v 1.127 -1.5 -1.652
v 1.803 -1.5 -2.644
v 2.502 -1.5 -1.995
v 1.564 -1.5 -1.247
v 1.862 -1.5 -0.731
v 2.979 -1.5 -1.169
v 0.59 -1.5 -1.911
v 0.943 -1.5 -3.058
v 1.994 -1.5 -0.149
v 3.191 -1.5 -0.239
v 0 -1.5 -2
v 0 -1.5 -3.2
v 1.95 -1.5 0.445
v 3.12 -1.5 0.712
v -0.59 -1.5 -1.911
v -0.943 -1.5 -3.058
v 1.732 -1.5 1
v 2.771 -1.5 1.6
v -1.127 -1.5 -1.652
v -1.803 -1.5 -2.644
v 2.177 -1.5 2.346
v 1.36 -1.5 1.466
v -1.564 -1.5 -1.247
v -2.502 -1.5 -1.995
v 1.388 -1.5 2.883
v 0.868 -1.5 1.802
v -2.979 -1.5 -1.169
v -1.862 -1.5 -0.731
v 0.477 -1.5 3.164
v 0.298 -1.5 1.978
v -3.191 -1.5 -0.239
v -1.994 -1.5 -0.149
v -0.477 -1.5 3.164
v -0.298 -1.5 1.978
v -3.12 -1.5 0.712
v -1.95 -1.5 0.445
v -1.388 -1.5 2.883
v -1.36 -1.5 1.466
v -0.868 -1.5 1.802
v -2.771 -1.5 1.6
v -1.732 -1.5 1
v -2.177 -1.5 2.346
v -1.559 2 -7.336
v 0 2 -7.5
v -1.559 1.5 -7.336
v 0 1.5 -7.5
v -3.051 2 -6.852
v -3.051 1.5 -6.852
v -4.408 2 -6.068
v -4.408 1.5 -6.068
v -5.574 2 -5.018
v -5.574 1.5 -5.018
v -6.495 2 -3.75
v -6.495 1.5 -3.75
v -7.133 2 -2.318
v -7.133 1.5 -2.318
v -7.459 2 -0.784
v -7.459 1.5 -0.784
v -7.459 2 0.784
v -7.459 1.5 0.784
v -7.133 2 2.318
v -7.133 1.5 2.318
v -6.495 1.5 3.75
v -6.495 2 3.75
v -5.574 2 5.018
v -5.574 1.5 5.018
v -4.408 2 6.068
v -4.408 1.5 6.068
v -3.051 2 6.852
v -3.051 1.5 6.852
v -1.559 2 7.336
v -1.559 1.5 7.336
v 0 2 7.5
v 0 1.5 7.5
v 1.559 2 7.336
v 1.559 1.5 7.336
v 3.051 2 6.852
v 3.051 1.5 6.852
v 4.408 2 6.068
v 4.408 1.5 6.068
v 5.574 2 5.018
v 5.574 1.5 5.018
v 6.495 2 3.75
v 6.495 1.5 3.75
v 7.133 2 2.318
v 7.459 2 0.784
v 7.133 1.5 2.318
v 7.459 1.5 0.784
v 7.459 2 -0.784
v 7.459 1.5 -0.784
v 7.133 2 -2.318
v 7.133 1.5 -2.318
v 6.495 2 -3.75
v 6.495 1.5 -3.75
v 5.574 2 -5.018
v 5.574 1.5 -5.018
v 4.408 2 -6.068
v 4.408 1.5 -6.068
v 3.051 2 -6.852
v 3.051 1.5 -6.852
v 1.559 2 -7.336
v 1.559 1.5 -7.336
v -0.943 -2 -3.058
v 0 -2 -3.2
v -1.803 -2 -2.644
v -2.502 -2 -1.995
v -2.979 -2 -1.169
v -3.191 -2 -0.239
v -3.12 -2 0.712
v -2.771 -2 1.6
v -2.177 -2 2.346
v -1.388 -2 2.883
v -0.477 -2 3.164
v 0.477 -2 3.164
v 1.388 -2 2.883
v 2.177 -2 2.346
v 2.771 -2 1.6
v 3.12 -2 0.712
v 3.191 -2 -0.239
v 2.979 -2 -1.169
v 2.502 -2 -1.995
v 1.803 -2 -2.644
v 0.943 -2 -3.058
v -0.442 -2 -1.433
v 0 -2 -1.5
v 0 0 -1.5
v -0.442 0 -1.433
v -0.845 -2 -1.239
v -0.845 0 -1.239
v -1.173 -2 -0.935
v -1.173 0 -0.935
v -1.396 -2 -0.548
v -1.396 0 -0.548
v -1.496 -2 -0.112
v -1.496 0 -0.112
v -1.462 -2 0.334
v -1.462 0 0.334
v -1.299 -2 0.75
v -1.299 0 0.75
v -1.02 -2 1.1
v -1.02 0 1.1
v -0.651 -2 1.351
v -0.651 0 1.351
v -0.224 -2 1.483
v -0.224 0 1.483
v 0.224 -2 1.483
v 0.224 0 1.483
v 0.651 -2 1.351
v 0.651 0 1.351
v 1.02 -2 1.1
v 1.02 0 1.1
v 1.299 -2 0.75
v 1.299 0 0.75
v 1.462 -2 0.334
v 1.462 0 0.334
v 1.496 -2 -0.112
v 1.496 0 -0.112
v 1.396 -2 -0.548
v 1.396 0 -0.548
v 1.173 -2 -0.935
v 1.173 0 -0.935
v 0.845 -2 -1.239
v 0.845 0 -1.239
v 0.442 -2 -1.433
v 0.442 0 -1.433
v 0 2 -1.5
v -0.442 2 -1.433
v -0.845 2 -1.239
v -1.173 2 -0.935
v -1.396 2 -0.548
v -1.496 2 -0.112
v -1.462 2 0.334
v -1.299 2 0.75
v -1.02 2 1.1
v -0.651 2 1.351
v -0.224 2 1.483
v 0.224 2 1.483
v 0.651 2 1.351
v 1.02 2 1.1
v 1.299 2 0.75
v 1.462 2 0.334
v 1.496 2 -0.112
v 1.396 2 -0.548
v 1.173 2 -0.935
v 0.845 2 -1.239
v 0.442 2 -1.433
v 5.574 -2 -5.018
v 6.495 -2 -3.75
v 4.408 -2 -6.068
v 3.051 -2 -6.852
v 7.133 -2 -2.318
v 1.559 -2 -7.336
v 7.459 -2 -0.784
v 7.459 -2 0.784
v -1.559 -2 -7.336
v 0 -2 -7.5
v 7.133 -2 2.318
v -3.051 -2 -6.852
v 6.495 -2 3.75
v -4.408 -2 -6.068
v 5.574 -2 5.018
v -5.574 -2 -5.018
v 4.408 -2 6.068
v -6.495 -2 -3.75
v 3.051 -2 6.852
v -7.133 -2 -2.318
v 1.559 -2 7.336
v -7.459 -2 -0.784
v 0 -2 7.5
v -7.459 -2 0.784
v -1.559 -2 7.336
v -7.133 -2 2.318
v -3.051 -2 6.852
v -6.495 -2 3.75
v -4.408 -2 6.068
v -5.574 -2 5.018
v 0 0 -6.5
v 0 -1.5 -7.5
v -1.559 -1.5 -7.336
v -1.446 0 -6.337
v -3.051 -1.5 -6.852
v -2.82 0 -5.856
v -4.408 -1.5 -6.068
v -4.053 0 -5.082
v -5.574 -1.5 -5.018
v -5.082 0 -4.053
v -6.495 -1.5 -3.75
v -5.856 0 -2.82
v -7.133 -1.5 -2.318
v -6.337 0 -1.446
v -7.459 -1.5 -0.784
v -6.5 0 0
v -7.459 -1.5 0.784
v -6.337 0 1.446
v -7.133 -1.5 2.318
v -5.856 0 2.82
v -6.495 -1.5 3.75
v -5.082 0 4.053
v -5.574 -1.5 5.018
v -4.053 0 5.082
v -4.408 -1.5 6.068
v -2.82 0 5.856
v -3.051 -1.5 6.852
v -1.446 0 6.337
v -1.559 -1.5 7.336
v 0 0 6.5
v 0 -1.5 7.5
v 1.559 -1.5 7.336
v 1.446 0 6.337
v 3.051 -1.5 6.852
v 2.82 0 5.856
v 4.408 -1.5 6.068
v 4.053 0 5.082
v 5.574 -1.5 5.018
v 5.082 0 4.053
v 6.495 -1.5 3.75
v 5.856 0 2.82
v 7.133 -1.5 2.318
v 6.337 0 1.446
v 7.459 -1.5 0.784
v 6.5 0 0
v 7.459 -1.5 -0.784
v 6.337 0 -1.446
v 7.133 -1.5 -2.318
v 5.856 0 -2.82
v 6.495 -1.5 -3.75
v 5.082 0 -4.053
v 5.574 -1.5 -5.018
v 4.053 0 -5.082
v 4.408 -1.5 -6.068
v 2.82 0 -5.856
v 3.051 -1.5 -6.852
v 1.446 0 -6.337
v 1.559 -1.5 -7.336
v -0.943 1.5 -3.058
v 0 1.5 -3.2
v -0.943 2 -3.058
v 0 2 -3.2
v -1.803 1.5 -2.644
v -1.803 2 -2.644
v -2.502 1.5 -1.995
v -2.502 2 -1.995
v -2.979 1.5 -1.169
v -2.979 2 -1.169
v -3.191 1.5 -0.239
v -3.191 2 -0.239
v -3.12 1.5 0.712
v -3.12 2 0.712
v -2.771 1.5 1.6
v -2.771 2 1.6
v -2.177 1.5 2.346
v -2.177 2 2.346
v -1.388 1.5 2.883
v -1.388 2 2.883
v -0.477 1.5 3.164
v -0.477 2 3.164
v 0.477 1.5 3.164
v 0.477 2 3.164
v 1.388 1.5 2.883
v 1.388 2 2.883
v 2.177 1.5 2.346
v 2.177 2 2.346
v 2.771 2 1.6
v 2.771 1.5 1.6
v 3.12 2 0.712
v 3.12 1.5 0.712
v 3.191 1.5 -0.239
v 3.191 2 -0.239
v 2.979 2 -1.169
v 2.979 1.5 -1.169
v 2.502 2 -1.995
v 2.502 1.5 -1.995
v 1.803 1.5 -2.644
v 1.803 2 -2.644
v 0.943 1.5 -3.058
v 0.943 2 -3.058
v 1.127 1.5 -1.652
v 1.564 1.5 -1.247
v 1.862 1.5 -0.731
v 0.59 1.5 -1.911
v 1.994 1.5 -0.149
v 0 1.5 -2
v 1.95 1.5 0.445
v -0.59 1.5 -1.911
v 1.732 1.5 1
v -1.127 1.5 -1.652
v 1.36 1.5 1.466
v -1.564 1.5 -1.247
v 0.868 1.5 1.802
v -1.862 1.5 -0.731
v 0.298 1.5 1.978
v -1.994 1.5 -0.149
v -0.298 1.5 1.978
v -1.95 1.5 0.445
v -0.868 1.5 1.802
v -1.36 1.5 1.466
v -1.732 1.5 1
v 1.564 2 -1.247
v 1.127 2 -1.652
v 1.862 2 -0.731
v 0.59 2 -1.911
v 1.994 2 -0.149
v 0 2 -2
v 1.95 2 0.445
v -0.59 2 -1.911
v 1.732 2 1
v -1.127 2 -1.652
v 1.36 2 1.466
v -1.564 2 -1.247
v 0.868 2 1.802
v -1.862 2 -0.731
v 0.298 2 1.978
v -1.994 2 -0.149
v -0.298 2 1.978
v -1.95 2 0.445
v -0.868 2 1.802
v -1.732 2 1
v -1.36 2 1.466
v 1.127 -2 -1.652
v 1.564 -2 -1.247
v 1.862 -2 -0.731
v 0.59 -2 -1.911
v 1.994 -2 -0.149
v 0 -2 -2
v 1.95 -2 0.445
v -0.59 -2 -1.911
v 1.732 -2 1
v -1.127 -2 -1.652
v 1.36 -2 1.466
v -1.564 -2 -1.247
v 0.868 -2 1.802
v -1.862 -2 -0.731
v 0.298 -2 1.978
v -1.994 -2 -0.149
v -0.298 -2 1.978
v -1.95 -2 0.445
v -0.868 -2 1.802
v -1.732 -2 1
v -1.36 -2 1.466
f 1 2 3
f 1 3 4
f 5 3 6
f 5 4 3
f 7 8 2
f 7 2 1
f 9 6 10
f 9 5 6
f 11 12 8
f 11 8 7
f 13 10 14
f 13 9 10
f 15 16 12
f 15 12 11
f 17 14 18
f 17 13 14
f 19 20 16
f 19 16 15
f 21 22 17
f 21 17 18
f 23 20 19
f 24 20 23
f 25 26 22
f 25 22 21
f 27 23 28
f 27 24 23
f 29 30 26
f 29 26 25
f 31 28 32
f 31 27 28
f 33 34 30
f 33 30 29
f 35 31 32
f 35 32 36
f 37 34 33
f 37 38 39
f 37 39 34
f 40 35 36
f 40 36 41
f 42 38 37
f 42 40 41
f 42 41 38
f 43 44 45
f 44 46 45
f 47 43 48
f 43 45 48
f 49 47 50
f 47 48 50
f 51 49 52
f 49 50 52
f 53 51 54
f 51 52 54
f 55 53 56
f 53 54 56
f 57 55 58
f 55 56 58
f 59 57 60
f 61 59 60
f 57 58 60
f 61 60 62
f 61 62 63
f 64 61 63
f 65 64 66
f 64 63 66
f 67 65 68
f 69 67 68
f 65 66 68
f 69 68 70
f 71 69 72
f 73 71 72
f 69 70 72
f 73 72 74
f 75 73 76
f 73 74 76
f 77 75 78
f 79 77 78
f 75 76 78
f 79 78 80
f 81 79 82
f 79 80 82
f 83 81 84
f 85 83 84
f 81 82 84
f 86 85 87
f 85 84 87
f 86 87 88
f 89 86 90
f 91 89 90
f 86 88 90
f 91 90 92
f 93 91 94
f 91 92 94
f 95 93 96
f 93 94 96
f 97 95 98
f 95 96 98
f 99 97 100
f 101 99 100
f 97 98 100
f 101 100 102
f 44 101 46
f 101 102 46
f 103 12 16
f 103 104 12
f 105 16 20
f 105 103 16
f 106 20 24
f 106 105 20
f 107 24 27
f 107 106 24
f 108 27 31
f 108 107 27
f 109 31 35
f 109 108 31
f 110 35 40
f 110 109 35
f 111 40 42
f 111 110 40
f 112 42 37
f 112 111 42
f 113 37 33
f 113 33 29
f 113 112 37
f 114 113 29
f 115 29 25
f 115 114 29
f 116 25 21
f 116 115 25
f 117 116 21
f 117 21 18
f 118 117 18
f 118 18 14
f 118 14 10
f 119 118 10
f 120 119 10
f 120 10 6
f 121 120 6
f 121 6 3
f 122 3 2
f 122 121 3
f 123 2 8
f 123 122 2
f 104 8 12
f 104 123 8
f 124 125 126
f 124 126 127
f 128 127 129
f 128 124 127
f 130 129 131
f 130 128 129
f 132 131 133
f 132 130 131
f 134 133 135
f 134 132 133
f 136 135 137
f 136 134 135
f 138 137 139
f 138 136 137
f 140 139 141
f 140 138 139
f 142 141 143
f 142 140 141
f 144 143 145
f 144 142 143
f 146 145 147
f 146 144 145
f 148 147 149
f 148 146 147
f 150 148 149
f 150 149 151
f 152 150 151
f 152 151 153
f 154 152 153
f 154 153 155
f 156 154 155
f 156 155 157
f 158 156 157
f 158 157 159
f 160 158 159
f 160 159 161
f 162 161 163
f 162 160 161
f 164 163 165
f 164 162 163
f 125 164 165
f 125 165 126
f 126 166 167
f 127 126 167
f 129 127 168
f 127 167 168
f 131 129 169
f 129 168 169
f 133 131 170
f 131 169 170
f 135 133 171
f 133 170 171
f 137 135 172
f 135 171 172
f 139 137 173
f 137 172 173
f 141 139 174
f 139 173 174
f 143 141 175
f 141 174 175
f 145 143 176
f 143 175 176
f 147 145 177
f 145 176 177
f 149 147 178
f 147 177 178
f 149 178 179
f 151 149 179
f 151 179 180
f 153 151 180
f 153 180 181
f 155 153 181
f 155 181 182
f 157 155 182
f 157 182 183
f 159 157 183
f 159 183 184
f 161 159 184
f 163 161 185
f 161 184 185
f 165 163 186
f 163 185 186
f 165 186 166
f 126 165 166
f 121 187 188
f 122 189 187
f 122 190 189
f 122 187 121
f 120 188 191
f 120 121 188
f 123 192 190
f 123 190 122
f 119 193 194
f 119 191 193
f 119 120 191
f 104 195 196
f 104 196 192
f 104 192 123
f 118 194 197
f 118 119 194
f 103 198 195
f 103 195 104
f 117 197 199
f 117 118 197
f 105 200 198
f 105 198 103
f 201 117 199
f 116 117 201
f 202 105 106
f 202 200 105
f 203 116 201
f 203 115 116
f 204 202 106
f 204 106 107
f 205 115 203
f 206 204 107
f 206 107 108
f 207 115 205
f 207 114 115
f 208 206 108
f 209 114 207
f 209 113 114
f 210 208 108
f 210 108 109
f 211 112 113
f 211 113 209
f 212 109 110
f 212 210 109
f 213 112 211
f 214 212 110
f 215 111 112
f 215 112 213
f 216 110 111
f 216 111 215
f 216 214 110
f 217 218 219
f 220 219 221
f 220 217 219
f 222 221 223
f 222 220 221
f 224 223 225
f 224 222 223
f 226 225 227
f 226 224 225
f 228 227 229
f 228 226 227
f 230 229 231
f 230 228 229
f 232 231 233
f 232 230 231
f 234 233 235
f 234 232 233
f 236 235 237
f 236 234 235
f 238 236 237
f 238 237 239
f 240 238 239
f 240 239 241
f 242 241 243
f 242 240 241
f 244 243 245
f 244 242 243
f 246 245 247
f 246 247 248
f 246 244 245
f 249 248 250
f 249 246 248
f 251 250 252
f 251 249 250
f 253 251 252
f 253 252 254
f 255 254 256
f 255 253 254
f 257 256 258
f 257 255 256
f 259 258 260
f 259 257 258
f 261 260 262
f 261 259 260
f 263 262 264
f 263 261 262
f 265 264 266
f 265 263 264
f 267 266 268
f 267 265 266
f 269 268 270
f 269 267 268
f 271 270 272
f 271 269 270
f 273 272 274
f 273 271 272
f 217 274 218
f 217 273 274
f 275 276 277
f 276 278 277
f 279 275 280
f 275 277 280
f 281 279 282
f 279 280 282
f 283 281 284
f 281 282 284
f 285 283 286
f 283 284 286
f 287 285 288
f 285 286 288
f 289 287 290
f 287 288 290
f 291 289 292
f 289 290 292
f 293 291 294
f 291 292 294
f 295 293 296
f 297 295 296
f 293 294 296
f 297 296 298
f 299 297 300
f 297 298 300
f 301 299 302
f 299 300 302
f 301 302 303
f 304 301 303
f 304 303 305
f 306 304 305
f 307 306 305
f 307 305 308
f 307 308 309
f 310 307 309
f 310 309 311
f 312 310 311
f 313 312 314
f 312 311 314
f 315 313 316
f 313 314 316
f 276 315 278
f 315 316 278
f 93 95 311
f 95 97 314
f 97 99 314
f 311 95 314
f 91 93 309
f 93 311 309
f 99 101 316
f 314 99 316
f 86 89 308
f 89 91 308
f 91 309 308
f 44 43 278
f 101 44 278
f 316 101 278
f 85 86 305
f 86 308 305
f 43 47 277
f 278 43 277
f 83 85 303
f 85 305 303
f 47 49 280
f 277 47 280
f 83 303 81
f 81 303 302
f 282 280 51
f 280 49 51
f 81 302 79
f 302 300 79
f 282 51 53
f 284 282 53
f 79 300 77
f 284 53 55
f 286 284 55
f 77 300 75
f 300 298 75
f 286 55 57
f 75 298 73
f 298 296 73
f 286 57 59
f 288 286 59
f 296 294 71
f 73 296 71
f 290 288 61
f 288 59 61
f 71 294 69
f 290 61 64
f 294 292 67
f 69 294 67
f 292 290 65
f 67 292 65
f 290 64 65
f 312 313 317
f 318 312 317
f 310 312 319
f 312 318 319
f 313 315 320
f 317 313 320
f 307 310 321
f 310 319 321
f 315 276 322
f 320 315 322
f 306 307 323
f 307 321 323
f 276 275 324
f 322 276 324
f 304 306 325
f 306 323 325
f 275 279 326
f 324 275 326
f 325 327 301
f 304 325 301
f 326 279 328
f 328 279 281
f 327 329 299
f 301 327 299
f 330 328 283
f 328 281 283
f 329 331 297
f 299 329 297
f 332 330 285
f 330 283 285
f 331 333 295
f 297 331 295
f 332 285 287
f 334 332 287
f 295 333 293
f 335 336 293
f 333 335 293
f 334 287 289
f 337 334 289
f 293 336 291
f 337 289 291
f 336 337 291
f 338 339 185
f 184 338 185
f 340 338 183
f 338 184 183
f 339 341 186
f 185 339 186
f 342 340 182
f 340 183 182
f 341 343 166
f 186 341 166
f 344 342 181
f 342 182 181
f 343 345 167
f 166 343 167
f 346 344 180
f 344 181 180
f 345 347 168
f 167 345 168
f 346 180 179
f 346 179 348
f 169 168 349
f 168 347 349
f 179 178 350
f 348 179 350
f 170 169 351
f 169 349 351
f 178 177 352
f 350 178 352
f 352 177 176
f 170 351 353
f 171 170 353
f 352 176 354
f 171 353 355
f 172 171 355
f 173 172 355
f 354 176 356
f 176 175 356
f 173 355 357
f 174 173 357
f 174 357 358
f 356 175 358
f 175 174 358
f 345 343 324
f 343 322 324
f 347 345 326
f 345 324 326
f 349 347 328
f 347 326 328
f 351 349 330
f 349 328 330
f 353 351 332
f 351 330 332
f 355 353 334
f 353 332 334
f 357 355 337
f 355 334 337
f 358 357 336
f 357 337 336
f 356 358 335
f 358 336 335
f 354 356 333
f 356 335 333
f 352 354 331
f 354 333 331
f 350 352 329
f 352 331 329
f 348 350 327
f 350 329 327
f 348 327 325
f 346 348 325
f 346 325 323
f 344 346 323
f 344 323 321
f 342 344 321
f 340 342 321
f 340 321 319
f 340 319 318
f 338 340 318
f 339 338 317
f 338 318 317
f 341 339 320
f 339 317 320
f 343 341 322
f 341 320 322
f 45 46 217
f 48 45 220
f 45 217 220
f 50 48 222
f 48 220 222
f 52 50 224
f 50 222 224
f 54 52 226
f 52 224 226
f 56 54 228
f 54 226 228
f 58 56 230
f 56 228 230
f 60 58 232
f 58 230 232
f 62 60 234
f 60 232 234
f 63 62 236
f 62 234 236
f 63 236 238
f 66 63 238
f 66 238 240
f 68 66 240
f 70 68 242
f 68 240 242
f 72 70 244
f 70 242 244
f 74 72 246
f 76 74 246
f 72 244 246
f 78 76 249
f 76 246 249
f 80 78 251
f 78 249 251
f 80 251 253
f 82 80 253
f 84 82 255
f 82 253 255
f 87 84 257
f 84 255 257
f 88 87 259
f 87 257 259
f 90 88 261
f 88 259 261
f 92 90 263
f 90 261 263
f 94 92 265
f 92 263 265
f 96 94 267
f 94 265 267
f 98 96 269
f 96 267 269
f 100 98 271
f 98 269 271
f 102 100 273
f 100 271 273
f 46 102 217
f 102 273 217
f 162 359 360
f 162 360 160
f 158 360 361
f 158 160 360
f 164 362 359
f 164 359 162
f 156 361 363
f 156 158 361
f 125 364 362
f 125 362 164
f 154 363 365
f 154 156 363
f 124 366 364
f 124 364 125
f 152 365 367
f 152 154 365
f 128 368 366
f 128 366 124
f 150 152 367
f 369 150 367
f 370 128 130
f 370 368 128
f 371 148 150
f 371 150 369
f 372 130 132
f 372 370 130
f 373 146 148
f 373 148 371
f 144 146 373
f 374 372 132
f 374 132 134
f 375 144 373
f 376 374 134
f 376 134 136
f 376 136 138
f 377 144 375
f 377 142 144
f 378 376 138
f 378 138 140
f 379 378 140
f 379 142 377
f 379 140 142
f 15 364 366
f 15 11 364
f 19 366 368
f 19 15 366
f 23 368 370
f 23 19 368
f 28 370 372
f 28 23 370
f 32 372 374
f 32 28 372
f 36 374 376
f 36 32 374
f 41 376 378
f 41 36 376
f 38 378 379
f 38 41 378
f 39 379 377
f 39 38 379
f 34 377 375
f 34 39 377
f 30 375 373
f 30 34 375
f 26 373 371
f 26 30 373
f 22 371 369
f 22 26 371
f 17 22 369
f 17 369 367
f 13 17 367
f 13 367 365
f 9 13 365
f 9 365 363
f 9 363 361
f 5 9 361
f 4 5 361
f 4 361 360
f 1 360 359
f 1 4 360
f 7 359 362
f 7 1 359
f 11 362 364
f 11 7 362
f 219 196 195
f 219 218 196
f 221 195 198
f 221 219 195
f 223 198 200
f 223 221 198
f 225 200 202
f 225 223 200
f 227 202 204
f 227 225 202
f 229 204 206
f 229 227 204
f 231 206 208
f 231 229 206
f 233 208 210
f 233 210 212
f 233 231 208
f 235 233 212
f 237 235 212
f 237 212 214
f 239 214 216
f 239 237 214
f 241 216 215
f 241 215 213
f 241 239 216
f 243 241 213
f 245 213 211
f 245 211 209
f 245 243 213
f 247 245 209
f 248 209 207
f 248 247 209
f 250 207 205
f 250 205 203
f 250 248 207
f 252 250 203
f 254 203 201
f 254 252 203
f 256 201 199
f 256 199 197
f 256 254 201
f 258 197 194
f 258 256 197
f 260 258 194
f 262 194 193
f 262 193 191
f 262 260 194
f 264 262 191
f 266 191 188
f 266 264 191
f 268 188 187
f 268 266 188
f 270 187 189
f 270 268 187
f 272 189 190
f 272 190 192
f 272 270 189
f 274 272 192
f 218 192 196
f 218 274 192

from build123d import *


with BuildPart() as part:
    # Sketch1 → Revolve1 (revolve)
    with BuildSketch(Plane.XY, mode=Mode.PRIVATE) as revolve1_sk:
        Polygon((-1.5, 0), (-1.5, 2), (-2, 2), (-2, 1.5), (-3.2, 1.5), (-3.2, 2), (-7.5, 2), (-7.5, 1.5), (-6.5, 0), align=None)
    revolve1 = revolve(revolve1_sk.sketch.rotate(Axis((0, 0, 0), (0, 1, 0)), 270), axis=Axis((0, 0, 0), (0, 1, 0)))

    # Mirror1: Revolve1 across plane
    add(revolve1.mirror(Plane(origin=(-6.5, 0, 0), x_dir=(0, 0, 1), z_dir=(0, 1, 0))))


solid = part.part
